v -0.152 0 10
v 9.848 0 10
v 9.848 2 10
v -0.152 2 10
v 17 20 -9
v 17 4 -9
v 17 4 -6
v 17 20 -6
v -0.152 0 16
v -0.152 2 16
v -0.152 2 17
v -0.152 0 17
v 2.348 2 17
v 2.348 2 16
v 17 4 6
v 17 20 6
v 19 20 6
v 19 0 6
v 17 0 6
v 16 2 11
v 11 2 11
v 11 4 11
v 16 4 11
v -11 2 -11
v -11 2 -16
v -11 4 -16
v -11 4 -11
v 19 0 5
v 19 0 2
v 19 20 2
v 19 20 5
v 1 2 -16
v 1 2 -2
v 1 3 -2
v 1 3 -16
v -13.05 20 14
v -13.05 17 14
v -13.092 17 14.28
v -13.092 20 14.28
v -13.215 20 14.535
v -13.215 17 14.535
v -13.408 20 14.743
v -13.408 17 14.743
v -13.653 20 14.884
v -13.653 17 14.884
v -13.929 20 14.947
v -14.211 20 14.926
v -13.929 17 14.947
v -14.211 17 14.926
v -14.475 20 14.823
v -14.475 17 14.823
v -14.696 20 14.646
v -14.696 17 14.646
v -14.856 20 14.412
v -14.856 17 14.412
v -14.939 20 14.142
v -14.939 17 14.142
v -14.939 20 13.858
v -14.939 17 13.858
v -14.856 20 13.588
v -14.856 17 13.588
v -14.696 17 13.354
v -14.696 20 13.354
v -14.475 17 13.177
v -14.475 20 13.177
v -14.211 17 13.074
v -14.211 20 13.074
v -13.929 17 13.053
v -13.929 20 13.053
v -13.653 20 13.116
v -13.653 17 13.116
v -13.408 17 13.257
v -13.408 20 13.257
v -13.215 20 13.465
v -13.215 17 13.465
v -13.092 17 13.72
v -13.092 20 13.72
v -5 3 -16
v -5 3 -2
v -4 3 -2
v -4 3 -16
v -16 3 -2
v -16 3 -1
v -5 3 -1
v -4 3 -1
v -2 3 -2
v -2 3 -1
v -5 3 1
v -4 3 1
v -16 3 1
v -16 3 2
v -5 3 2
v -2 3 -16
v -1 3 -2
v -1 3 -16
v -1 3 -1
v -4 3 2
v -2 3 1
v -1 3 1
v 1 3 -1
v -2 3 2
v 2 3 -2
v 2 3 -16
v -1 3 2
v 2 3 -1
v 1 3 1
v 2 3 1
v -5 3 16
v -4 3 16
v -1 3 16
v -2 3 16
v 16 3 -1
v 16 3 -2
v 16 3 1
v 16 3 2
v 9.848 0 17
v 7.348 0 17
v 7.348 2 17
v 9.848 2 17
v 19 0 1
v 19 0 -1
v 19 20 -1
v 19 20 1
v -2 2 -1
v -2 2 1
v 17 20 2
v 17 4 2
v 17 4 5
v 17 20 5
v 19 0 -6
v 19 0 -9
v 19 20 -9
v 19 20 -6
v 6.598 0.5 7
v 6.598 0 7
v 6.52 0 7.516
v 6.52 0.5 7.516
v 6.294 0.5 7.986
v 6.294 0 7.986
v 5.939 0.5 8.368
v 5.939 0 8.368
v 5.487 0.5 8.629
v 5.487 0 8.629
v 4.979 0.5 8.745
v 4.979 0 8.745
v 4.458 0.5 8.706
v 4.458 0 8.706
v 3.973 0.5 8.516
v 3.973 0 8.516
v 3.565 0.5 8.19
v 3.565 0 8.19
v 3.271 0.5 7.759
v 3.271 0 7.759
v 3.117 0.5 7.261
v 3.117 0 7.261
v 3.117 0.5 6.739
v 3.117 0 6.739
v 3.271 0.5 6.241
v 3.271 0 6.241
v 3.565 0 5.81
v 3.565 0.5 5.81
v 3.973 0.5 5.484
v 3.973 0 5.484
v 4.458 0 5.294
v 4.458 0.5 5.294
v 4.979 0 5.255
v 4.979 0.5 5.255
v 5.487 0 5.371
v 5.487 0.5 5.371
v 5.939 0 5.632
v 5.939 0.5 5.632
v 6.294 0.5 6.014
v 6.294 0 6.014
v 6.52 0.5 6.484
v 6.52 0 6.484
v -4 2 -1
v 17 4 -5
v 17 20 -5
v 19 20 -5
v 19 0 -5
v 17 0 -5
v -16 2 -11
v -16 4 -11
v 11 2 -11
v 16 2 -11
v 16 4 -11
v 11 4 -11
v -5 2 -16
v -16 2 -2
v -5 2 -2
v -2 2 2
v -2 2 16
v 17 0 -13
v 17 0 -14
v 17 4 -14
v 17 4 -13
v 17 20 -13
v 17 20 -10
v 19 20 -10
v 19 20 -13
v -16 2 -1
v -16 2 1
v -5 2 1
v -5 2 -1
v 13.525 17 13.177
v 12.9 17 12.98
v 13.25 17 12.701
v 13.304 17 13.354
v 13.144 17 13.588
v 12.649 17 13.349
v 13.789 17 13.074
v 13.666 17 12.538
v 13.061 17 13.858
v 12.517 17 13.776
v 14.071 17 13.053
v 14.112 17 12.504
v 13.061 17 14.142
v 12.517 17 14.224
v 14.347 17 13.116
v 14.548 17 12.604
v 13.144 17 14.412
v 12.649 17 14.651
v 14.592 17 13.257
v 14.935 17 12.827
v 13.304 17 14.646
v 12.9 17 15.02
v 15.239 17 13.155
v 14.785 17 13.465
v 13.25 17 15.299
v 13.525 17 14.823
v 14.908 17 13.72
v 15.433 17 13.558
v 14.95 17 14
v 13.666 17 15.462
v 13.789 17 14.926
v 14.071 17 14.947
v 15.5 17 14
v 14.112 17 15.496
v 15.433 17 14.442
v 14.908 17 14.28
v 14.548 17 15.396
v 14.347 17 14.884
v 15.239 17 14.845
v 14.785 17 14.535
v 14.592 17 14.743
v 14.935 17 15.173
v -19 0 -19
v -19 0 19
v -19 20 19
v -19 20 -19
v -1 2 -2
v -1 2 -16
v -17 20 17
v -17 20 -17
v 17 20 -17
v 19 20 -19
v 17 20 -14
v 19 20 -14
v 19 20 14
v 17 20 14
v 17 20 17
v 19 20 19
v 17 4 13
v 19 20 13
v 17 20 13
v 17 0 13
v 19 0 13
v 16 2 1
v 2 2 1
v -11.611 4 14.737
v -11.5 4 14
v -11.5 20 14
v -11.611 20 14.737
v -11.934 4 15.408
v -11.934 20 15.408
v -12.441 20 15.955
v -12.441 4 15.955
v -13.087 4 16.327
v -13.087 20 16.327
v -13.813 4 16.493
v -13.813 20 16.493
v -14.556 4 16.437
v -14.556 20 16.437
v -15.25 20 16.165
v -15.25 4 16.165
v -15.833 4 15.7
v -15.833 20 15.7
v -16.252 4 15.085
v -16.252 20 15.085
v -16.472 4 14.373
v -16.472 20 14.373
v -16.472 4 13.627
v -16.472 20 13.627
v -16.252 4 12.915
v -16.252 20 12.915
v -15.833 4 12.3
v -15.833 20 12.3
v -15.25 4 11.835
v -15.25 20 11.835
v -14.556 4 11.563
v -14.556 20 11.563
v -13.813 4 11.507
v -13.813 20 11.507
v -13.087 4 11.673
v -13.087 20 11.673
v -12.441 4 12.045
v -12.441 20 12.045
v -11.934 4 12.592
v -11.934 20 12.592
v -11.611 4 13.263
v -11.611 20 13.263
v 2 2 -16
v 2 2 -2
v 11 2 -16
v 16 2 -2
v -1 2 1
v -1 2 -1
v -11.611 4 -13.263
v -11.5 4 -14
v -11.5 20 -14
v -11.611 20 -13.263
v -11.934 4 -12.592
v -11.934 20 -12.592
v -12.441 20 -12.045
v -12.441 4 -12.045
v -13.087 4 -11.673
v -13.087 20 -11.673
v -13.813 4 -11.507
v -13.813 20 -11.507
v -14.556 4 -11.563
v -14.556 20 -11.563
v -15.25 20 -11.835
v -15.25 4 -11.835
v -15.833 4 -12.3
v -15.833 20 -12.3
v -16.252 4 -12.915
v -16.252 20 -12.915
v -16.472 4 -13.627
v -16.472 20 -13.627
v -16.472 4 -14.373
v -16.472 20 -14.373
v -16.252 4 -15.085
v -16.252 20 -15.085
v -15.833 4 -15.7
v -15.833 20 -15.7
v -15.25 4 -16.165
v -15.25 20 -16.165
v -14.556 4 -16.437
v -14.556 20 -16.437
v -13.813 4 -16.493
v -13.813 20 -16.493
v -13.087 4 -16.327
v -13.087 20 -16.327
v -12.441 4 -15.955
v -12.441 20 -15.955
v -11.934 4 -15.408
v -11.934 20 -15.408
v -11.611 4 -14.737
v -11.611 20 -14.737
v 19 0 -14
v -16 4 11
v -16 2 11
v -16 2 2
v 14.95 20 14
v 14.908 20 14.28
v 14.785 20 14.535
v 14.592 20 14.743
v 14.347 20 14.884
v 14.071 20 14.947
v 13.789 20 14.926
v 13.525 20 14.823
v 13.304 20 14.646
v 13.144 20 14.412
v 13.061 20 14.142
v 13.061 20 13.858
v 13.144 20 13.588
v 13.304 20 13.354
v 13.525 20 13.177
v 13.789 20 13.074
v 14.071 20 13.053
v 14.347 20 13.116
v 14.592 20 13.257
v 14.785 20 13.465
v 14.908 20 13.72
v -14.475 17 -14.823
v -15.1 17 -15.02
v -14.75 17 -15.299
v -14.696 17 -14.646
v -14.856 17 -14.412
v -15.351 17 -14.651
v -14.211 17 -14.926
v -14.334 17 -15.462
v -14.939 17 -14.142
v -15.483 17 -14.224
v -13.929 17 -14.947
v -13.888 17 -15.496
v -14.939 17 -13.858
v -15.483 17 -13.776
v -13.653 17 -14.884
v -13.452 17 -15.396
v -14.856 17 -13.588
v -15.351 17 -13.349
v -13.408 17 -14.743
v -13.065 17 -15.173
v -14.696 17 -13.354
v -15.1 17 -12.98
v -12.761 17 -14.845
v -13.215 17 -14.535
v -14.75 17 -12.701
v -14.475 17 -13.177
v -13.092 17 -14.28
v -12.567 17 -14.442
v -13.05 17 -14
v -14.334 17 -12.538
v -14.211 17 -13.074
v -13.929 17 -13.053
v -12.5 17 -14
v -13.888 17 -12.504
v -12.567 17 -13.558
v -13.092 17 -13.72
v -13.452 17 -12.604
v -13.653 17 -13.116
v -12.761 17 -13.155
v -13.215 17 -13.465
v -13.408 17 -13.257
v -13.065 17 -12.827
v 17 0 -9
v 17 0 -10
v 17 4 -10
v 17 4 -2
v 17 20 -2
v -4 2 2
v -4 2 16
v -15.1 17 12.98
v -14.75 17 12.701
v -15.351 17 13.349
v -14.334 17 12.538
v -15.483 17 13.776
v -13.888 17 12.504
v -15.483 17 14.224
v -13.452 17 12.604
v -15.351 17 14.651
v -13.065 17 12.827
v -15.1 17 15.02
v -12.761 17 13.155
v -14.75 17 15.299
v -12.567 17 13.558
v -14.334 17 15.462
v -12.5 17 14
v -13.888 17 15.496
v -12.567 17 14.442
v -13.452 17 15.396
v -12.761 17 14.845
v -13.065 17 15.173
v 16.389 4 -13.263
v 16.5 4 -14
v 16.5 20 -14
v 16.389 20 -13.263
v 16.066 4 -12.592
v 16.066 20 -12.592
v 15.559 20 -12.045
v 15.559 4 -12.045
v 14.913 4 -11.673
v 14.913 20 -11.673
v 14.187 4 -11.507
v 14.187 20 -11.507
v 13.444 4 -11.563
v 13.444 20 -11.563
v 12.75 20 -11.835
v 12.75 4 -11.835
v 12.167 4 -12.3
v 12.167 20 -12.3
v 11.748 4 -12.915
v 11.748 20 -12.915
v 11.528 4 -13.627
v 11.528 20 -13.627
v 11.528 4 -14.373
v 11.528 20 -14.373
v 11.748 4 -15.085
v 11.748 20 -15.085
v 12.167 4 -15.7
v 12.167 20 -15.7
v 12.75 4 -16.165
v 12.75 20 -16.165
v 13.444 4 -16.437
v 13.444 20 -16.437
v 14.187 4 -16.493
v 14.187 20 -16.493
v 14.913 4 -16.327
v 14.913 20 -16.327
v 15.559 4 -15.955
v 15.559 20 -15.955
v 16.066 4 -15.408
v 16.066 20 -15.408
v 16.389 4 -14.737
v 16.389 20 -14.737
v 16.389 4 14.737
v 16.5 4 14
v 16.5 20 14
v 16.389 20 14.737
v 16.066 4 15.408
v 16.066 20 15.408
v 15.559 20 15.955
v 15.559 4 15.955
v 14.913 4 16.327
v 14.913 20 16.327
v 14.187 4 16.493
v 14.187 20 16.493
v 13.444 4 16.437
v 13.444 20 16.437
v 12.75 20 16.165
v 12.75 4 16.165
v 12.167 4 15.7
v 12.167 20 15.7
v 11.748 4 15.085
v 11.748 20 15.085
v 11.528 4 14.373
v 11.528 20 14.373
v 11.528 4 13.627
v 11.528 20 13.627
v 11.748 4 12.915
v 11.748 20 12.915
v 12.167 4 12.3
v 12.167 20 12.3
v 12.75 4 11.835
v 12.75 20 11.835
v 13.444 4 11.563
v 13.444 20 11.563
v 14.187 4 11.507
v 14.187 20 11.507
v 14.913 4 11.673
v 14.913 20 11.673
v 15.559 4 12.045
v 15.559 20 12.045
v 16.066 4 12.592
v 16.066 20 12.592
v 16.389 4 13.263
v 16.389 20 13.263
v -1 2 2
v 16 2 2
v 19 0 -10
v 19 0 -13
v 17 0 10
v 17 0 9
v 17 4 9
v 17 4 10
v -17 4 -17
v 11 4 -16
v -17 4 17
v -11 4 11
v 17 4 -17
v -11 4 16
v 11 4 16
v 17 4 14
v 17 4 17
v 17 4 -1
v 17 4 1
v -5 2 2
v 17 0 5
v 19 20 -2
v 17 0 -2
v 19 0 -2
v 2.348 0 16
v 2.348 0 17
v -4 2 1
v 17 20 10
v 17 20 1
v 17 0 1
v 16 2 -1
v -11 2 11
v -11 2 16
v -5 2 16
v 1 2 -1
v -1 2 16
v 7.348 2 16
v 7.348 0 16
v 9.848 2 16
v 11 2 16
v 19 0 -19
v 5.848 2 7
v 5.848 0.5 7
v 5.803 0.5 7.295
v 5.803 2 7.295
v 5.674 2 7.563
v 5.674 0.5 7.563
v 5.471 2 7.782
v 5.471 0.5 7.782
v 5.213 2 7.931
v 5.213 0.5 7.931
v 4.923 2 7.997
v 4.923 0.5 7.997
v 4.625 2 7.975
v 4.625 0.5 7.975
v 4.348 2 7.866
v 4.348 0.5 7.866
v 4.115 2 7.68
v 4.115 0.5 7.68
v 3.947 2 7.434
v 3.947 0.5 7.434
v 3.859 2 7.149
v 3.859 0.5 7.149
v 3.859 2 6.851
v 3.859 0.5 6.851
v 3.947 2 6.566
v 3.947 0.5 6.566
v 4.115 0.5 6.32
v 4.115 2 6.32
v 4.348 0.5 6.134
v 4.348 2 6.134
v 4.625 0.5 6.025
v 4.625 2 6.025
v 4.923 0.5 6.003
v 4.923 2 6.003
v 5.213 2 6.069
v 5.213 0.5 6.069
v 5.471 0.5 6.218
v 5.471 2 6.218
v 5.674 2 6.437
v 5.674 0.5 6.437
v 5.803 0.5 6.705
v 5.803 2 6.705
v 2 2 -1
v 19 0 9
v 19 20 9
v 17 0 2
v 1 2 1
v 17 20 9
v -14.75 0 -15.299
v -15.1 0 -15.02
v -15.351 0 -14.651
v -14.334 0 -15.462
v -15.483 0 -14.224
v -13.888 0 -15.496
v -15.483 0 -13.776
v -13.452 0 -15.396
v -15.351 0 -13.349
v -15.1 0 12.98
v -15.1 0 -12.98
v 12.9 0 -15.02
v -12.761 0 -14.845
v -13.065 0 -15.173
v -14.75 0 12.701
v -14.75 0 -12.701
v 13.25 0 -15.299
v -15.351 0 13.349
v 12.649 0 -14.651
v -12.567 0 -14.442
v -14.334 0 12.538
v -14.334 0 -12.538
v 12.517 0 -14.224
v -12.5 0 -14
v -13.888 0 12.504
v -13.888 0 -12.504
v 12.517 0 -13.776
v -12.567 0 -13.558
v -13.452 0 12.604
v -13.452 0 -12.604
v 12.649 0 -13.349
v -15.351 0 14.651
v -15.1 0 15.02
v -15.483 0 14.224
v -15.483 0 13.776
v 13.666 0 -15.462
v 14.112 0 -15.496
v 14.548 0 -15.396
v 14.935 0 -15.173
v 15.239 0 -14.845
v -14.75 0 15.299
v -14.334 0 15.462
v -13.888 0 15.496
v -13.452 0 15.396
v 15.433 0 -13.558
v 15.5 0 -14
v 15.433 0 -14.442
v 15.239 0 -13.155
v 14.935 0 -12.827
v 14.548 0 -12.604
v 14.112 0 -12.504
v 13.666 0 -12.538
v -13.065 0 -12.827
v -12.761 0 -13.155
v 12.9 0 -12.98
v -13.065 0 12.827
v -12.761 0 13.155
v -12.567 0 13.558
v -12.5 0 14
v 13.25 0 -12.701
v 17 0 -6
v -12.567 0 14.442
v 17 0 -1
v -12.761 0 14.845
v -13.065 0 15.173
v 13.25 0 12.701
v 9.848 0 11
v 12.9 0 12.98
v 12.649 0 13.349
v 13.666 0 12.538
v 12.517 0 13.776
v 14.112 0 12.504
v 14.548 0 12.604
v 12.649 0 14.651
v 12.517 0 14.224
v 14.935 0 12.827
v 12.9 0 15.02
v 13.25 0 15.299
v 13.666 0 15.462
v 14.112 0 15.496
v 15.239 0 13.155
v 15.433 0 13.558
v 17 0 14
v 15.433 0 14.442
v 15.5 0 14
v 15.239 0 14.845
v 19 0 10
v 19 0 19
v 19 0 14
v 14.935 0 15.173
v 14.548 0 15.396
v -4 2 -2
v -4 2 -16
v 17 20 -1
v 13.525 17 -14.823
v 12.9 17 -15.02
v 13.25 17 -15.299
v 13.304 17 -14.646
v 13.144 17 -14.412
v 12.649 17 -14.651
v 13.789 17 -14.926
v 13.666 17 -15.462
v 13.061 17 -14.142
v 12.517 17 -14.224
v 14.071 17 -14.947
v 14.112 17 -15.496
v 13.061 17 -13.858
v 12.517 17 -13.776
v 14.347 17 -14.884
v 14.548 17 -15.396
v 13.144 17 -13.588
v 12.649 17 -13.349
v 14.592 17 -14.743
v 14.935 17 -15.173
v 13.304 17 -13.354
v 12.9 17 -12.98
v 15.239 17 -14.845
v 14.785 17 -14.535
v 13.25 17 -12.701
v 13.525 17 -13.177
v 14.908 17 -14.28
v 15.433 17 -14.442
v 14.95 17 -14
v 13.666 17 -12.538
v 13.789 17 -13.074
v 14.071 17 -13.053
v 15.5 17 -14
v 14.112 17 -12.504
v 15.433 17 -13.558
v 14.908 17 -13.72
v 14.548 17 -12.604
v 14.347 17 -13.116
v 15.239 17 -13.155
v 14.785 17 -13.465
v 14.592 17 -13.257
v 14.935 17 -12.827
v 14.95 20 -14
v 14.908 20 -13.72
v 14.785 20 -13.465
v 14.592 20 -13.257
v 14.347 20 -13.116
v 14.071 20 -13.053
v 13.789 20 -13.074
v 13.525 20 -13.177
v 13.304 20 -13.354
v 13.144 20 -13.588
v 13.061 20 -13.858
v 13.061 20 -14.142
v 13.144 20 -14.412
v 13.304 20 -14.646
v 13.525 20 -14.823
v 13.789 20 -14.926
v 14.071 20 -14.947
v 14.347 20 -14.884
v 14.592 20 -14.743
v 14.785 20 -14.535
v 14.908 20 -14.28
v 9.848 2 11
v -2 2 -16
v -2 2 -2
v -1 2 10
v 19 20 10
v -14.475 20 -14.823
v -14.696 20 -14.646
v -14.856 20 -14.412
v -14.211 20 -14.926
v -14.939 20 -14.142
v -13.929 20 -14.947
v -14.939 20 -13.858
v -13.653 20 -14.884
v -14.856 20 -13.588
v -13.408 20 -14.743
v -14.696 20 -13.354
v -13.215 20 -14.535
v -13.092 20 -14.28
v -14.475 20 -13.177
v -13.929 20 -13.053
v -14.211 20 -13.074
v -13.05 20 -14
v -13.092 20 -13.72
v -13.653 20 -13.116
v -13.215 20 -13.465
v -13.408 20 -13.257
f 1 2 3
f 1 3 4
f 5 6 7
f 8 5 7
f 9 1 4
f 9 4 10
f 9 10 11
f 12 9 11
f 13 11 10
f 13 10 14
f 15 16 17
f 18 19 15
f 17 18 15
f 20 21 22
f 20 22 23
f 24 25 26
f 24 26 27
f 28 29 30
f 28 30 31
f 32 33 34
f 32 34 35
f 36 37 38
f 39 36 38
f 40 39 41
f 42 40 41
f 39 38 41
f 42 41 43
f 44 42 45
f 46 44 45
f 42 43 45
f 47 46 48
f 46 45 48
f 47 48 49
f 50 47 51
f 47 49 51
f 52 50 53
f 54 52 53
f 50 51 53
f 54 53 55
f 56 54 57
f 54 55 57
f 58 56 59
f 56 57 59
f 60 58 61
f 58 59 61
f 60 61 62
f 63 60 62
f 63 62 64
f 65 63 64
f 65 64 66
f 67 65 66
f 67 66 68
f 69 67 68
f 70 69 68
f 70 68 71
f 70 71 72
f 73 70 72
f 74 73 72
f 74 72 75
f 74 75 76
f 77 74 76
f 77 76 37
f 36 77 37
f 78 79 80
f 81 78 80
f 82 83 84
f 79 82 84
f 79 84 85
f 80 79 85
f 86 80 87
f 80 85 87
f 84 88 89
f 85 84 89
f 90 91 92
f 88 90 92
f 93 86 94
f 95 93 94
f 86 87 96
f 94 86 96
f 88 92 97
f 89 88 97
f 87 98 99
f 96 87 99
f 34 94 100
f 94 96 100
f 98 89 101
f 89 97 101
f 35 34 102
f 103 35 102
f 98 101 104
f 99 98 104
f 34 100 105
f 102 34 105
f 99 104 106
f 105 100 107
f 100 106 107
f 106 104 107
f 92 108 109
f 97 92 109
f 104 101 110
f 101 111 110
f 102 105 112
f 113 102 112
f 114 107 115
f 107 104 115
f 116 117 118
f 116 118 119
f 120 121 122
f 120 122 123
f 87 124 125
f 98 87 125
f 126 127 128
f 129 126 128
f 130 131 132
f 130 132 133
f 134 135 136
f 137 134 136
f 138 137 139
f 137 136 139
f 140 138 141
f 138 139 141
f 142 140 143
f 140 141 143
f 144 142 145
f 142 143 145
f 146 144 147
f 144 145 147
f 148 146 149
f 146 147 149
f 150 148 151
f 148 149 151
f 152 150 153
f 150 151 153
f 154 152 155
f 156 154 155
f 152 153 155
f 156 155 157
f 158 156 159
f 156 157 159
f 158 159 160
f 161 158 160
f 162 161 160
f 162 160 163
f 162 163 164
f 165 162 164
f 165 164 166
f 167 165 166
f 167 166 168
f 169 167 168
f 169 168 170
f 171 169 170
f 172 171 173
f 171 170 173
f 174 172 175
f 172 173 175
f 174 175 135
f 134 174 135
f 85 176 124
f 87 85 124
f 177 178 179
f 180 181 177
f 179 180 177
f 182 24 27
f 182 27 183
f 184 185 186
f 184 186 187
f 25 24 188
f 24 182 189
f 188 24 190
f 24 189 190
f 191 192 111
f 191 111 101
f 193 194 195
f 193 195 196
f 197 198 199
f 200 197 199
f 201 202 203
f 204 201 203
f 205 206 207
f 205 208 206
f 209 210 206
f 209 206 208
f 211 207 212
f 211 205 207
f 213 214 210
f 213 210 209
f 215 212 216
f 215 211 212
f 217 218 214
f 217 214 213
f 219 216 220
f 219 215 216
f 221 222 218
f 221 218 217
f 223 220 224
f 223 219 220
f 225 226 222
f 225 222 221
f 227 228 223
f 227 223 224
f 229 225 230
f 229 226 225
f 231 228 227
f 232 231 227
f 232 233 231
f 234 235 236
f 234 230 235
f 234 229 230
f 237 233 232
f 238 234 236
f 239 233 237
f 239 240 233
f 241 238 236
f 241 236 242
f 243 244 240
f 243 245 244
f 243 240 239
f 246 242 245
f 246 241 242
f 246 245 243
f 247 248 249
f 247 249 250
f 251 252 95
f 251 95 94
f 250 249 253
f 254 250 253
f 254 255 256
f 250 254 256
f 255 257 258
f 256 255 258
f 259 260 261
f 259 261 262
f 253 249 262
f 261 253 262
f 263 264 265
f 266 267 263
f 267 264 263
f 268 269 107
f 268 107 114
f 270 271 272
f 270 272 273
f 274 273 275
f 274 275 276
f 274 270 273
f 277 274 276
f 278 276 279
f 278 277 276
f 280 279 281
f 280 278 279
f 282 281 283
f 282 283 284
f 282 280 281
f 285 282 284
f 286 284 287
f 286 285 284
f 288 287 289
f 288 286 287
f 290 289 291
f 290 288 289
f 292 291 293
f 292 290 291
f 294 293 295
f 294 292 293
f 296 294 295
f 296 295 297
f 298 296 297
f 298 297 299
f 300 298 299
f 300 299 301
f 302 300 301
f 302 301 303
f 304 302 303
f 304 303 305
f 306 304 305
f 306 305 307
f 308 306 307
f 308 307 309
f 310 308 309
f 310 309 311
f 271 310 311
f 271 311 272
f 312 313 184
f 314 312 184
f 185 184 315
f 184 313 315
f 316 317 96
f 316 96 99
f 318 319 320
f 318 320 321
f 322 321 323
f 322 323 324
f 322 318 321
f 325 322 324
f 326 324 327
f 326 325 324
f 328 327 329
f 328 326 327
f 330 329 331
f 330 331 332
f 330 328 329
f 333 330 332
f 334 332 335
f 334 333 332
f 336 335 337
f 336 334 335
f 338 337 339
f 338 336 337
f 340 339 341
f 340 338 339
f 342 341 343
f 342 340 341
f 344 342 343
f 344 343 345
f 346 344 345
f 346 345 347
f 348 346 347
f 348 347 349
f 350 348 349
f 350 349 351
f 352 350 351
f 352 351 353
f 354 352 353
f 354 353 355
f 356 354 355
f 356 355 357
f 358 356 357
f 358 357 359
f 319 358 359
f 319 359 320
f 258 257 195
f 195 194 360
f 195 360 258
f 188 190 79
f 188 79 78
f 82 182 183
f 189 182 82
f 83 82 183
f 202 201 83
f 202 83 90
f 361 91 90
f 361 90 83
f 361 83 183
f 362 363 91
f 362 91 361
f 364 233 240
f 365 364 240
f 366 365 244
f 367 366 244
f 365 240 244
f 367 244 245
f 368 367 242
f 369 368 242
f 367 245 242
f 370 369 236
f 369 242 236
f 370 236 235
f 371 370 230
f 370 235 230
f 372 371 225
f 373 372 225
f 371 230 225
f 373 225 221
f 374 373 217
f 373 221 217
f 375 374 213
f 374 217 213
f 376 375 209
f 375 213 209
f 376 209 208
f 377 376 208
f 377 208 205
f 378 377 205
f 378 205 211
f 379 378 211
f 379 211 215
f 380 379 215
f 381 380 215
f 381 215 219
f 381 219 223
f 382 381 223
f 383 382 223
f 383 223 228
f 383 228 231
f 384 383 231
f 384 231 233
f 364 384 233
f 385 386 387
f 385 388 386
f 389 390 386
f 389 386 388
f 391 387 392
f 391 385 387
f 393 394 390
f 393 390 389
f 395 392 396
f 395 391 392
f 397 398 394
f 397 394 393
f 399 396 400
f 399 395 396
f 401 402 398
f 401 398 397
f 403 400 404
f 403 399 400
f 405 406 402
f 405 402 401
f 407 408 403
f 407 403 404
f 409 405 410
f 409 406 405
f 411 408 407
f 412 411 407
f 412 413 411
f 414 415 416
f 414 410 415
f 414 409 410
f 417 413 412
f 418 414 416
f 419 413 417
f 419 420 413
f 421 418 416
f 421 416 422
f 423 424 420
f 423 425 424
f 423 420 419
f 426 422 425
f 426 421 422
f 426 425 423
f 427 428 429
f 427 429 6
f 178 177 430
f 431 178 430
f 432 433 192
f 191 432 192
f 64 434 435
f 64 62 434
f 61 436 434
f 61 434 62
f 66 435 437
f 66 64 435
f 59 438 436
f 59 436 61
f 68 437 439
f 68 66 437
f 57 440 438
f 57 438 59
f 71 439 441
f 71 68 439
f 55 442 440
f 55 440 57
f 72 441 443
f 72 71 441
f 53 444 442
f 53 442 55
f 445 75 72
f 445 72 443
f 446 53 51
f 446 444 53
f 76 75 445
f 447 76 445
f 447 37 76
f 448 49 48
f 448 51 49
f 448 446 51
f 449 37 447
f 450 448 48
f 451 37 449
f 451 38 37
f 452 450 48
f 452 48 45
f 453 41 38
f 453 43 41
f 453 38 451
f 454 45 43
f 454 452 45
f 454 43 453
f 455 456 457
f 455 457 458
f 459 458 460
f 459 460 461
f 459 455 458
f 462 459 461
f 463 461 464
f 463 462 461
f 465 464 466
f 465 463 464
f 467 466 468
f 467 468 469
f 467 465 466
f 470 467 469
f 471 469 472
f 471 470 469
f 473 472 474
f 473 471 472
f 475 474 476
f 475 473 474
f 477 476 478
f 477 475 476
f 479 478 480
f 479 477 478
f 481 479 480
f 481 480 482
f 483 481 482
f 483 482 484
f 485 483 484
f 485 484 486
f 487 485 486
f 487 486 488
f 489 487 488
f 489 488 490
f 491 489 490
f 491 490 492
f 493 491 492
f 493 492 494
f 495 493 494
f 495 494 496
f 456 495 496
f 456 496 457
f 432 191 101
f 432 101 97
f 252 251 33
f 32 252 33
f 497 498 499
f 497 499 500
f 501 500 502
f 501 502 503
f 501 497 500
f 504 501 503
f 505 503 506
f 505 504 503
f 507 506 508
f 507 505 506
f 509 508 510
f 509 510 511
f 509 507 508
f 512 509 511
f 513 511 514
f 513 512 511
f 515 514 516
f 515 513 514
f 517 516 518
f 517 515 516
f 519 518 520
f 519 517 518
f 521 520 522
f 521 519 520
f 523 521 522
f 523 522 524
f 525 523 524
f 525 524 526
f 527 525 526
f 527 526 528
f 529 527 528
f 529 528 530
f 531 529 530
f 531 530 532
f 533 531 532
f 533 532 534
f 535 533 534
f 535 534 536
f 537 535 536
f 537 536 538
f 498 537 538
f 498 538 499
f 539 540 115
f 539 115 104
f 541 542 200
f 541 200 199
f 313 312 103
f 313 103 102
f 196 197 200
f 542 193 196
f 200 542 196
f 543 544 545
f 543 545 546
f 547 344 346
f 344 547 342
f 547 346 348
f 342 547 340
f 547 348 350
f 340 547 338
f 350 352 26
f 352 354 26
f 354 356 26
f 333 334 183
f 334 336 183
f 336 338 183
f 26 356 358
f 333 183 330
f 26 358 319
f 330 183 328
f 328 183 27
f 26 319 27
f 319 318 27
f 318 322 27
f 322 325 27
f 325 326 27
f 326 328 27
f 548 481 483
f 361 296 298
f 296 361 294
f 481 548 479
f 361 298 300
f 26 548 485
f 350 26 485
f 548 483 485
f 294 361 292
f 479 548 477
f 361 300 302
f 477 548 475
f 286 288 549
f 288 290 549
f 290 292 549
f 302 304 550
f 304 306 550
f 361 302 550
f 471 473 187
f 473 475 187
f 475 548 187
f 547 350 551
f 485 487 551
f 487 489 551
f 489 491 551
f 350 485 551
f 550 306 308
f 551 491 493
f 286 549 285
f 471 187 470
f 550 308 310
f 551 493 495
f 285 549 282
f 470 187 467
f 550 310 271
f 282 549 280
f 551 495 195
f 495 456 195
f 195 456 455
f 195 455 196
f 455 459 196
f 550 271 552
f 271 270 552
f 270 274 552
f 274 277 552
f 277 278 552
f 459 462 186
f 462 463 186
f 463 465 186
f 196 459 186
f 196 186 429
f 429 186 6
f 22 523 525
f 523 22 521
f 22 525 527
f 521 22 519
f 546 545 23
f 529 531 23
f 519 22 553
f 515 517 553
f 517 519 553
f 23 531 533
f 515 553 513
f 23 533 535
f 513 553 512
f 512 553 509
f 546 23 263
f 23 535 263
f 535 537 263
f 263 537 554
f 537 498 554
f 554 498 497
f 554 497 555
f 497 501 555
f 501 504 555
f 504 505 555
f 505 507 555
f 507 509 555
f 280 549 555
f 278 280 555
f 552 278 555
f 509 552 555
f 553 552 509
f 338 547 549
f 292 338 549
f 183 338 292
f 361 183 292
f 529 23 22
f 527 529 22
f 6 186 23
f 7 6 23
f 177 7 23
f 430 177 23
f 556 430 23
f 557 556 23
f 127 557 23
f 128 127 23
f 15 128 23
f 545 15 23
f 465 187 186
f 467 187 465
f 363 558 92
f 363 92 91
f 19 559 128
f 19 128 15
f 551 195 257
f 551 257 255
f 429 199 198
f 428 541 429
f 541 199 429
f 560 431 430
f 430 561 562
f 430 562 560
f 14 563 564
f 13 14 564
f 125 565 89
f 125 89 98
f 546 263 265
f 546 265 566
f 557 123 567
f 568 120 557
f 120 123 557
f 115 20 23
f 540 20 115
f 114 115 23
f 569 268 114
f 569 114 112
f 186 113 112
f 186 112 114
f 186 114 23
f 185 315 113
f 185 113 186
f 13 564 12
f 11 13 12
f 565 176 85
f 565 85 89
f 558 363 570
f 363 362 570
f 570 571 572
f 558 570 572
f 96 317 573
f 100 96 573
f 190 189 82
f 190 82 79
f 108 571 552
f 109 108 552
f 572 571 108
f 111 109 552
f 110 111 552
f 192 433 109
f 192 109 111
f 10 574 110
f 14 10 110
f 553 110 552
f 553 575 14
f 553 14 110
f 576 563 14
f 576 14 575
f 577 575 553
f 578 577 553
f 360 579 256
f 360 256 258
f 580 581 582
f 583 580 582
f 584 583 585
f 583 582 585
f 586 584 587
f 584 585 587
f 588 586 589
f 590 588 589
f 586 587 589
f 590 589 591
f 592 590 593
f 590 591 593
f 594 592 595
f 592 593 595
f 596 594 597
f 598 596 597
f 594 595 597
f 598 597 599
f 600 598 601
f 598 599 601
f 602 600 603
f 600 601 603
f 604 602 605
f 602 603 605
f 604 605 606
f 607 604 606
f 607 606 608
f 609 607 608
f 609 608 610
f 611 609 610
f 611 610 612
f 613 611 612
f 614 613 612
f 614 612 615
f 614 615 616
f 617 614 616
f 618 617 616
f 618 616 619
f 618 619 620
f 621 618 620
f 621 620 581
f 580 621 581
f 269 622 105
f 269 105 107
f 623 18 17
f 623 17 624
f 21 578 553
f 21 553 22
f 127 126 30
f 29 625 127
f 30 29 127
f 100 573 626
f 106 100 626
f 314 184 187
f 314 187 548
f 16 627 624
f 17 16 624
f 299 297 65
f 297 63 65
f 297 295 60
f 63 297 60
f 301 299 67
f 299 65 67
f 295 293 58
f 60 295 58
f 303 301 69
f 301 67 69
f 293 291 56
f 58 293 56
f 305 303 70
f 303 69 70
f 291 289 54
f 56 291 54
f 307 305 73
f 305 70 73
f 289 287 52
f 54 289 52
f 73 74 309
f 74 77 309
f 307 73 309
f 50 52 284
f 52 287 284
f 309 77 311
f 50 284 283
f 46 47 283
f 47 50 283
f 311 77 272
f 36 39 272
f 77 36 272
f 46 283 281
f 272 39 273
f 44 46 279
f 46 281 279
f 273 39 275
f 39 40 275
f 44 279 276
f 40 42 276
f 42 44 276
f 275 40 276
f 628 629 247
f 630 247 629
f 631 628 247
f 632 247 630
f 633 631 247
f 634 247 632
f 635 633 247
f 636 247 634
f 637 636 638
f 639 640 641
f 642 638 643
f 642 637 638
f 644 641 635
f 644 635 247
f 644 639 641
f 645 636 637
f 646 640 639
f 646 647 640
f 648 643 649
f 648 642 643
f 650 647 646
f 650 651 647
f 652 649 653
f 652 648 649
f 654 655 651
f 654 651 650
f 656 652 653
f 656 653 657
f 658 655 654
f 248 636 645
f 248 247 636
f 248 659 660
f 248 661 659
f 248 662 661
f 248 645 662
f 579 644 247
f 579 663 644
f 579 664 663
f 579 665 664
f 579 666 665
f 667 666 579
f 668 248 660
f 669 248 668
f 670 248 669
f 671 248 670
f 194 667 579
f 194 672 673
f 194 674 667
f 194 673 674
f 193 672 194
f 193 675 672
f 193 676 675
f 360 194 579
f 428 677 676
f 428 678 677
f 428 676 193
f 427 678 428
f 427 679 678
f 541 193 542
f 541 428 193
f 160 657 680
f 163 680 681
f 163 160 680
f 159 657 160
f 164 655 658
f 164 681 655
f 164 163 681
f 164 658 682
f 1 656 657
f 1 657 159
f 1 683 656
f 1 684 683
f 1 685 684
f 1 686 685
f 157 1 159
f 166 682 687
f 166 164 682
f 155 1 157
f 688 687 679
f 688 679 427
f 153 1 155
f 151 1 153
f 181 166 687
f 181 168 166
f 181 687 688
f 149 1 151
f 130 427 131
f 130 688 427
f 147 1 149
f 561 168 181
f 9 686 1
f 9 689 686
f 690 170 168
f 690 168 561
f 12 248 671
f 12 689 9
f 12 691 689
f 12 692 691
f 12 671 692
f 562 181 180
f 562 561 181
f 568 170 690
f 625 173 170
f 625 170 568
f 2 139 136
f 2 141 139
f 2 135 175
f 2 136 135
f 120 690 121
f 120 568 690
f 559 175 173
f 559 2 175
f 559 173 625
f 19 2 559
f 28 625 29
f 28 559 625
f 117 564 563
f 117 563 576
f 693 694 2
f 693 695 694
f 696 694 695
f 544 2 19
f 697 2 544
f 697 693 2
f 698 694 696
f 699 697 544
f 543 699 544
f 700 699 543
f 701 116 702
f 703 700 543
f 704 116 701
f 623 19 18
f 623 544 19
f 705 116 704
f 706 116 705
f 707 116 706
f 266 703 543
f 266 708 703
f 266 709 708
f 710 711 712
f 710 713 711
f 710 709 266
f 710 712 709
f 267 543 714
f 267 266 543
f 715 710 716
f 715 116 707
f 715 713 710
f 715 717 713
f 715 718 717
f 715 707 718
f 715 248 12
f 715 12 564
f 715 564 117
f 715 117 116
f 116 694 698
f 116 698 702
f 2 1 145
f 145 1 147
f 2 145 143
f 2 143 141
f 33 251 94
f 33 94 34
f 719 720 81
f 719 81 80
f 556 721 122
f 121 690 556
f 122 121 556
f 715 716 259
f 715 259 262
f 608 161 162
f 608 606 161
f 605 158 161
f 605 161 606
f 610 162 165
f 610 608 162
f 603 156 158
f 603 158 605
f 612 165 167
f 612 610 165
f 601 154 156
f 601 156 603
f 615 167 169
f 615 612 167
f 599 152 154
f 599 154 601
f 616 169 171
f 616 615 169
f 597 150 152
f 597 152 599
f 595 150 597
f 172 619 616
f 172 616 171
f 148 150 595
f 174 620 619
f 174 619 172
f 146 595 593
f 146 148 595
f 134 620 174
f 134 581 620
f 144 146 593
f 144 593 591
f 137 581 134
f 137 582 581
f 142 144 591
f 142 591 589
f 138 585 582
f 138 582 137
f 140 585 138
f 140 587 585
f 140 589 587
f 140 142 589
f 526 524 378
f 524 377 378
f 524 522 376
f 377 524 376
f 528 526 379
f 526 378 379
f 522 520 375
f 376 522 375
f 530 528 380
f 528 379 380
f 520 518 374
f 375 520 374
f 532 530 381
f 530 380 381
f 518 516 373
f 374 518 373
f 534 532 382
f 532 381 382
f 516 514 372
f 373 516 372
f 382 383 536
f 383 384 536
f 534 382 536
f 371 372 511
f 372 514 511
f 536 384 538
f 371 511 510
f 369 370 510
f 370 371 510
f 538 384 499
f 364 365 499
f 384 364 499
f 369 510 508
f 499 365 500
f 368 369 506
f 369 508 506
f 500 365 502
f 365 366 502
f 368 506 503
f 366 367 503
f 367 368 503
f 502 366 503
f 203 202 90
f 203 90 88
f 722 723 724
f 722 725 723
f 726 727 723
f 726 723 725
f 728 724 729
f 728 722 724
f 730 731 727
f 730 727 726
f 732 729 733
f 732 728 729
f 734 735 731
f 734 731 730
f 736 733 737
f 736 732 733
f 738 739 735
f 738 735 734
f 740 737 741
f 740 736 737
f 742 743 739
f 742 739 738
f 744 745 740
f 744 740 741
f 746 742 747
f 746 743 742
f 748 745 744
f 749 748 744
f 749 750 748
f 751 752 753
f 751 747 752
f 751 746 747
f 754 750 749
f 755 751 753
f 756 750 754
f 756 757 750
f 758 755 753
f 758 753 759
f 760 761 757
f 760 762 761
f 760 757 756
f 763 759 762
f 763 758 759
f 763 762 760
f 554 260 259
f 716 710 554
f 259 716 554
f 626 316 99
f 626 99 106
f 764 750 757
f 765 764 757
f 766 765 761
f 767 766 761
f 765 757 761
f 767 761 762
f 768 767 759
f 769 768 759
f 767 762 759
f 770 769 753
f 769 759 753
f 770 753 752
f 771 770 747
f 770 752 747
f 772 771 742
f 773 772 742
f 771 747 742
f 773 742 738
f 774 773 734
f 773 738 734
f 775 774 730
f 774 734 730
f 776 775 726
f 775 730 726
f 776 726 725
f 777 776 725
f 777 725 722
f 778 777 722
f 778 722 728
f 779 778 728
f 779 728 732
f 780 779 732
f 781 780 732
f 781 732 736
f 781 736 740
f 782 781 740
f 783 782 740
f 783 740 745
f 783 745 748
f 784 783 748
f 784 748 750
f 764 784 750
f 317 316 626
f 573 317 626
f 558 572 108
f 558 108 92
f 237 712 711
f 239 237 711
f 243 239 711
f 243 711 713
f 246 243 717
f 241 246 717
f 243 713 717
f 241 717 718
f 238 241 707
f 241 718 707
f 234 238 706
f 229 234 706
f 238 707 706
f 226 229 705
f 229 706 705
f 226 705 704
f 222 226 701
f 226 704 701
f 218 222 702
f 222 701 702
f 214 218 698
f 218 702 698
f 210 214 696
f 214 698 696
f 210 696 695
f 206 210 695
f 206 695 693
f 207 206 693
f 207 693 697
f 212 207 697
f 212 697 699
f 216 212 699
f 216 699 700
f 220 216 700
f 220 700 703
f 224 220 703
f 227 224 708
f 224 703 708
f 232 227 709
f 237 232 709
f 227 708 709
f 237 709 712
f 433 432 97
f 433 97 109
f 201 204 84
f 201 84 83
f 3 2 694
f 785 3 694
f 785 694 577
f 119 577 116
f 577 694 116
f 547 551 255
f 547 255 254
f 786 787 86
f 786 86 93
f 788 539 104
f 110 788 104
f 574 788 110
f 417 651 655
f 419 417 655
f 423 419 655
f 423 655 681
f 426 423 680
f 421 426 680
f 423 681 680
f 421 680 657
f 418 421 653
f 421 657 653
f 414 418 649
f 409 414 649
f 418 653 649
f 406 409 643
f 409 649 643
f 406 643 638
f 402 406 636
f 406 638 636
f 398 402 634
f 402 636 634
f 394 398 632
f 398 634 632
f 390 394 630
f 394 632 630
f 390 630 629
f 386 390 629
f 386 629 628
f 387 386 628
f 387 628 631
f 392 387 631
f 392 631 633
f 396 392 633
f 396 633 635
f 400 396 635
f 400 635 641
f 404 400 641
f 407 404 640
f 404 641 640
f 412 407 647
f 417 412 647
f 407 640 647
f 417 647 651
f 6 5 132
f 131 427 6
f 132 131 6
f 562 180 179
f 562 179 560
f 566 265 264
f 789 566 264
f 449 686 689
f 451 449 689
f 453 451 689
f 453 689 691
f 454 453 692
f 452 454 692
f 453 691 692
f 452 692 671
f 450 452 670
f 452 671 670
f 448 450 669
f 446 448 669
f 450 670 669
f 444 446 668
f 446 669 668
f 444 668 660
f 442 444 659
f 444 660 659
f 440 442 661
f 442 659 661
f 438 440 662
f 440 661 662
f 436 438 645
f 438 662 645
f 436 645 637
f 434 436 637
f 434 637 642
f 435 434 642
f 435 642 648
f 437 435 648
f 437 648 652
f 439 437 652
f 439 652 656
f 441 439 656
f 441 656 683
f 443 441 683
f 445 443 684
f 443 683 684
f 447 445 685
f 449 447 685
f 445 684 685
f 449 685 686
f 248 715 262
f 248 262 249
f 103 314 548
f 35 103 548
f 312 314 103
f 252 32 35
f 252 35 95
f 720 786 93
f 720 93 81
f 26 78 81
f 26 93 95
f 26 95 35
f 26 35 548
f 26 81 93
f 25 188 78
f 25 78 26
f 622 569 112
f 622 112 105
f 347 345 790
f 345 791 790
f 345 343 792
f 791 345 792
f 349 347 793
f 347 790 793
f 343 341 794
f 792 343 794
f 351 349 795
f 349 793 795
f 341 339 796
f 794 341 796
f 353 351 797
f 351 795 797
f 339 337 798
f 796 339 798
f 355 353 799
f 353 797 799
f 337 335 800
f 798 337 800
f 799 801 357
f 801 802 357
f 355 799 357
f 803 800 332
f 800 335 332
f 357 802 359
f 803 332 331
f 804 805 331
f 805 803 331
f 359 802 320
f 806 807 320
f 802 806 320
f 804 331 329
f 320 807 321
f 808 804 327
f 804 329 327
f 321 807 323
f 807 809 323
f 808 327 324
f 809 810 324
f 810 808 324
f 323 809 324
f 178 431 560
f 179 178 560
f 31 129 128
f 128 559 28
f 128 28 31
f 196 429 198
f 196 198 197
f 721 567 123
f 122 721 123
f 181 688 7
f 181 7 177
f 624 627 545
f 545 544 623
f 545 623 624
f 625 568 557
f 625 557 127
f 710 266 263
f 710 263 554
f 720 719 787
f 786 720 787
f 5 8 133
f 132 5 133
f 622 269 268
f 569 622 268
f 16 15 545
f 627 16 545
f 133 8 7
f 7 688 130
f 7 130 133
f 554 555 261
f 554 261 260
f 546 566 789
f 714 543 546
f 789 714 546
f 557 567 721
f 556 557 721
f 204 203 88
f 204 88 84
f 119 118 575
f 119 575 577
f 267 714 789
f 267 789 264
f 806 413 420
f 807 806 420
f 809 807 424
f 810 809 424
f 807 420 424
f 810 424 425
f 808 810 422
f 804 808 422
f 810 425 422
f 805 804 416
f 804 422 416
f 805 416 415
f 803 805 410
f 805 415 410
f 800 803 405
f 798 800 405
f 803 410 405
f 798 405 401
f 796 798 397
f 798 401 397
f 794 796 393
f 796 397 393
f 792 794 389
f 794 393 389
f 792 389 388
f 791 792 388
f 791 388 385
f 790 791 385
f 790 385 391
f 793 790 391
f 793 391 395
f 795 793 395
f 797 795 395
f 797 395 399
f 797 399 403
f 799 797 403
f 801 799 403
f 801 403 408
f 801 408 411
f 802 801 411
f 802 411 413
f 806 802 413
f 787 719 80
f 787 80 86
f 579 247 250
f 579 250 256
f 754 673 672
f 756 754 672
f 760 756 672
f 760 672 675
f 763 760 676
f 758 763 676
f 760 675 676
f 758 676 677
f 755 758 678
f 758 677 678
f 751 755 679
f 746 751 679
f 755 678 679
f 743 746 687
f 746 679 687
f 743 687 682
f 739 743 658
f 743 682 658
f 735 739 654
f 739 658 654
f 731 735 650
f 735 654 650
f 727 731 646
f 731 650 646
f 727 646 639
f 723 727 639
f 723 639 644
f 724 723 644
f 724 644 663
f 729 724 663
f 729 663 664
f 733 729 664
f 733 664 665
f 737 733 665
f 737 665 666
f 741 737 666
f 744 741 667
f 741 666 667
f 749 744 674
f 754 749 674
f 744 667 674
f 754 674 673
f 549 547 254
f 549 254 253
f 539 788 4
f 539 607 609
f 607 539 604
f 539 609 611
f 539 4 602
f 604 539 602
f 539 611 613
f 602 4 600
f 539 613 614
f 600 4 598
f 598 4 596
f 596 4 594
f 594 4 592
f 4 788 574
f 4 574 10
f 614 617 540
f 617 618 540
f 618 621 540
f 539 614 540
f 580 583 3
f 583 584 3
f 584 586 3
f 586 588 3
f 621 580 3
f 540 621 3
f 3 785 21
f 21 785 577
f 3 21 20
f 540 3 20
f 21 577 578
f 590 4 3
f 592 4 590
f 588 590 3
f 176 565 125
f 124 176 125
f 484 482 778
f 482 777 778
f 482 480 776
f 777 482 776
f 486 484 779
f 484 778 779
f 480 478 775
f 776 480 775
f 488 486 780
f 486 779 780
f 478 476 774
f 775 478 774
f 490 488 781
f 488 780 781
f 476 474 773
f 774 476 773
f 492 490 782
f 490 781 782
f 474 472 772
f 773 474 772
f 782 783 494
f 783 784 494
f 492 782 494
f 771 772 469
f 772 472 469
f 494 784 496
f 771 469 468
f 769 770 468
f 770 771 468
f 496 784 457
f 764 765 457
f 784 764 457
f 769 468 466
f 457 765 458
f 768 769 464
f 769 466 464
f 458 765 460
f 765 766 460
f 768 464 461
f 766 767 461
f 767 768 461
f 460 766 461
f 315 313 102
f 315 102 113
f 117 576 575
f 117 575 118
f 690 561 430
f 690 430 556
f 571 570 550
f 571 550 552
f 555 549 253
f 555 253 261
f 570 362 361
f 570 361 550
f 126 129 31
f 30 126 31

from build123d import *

# Parameters (mm, degrees)
F0_W      = 2
F0_H      = 2
F1_DEPTH  = 3
F0_H_2    = 14
F0_W_2    = 14
F0_W_3    = 11
F2_DEPTH  = 2
F0_R      = 2.5
F3_DEPTH  = 4
F0_R_2    = 1.5
F0_R_3    = 0.95
F4_DEPTH  = 20
F5_DEPTH  = 17
F6_DEPTH  = 17
F7_DEPTH  = 17
F8_DEPTH  = 17
F0_W_4    = 6
F0_H_3    = 6
F9_DEPTH  = 2
F0_H_4    = 3
F10_DEPTH = 20
F0_W_5    = 3
F0_W_6    = 5
F0_W_7    = 1.1521804929
F0_H_5    = 5
F0_R_4    = 1.75
F0_R_5    = 1
F0_W_8    = 0.8478195071
F11_DEPTH = 2
F0_H_6    = 1
F12_DEPTH = 4
F0_W_9    = 2.5
F13_DEPTH = 4
F14_DEPTH = 2
F15_DEPTH = 2
F16_DEPTH = 0.5


# Not quite as in the source:
# - a feature names something its author has since deleted; it is built from what else it names


with BuildPart() as f1:
    # F0 (on Front) → F1 (new body)
    with BuildSketch(Plane.XZ):
        Polygon((16, 1), (16, 2), (2, 2), (1, 2), (-1, 2), (-1, 10), (-1, 16), (-2, 16), (-2, 2), (-4, 2), (-4, 16), (-5, 16), (-5, 2), (-16, 2), (-16, 1), (-5, 1), (-5, -1), (-16, -1), (-16, -2), (-5, -2), (-5, -16), (-4, -16), (-4, -2), (-2, -2), (-2, -16), (-1, -16), (-1, -2), (1, -2), (1, -16), (2, -16), (2, -2), (16, -2), (16, -1), (2, -1), (2, 1), align=None)
        with Locations((-3, 0)):
            Rectangle(F0_W, F0_H, mode=Mode.SUBTRACT)
        Rectangle(F0_W, F0_H, mode=Mode.SUBTRACT)
    extrude(amount=-F1_DEPTH)

    # F0 (on Front) → F2 (join)
    with BuildSketch(Plane.XZ):
        Polygon((16, 2), (16, 10.1685791543), (16, 11), (11, 11), (9.8478195071, 11), (9.8478195071, 10.2023985237), (9.8478195071, 10), (7.6956390142, 10), (7.6956390142, 7.9433578615), (7.6956390142, 6.0566421385), (7.6956390142, 4), (4.8478195071, 4), (2, 4), (2, 6.0566421385), (2, 7.9433578615), (2, 10), (-0.1521804929, 10), (-1, 10), (-1, 2), (1, 2), (2, 2), align=None)
        with Locations((-3, 9)):
            Rectangle(F0_W, F0_H_2)
        Polygon((16, -11), (16, -2), (2, -2), (2, -16), (11, -16), (11, -11), align=None)
        with Locations((9, 0)):
            Rectangle(F0_W_2, F0_H)
        with Locations((-10.5, 0)):
            Rectangle(F0_W_3, F0_H)
        Polygon((-11, -11), (-11, -16), (-5, -16), (-5, -2), (-16, -2), (-16, -11), align=None)
        with Locations((-3, -9)):
            Rectangle(F0_W, F0_H_2)
        with Locations((0, -9)):
            Rectangle(F0_W, F0_H_2)
        Polygon((-5, 2), (-5, 16), (-11, 16), (-11, 11), (-16, 11), (-16, 10), (-10, 10), (-10, 4), (-16, 4), (-16, 2), align=None)
        with Locations((-3, 0)):
            Rectangle(F0_W, F0_H)
        Rectangle(F0_W, F0_H)
    extrude(amount=-F2_DEPTH)

    # F0 (on Front) → F3 (join)
    with BuildSketch(Plane.XZ):
        Polygon((11, 11), (16, 11), (17, 11), (17, 13), (17, 14), (17, 17), (14, 17), (11, 17), (11, 16), align=None)
        with Locations((14, 14)):
            Circle(F0_R, mode=Mode.SUBTRACT)
        Polygon((-11, 16), (-11, 17), (-14, 17), (-17, 17), (-17, 14), (-17, 11), (-16, 11), (-11, 11), align=None)
        with Locations((-14, 14)):
            Circle(F0_R, mode=Mode.SUBTRACT)
        Polygon((-14, -17), (-11, -17), (-11, -16), (-11, -11), (-16, -11), (-17, -11), (-17, -14), (-17, -17), align=None)
        with Locations((-14, -14)):
            Circle(F0_R, mode=Mode.SUBTRACT)
        Polygon((17, -11), (16, -11), (11, -11), (11, -16), (11, -17), (14, -17), (17, -17), (17, -14), (17, -13), align=None)
        with Locations((14, -14)):
            Circle(F0_R, mode=Mode.SUBTRACT)
    extrude(amount=-F3_DEPTH)

    # F0 (on Front) → F4 (join)
    with BuildSketch(Plane.XZ):
        with Locations((14, 14)):
            Circle(F0_R)
        with Locations((14, 14)):
            Circle(F0_R_2, mode=Mode.SUBTRACT)
        with Locations((14, 14)):
            Circle(F0_R_2)
        with Locations((14, 14)):
            Circle(F0_R_3, mode=Mode.SUBTRACT)
        with Locations((-14, 14)):
            Circle(F0_R)
        with Locations((-14, 14)):
            Circle(F0_R_2, mode=Mode.SUBTRACT)
        with Locations((-14, 14)):
            Circle(F0_R_2)
        with Locations((-14, 14)):
            Circle(F0_R_3, mode=Mode.SUBTRACT)
        with Locations((-14, -14)):
            Circle(F0_R)
        with Locations((-14, -14)):
            Circle(F0_R_2, mode=Mode.SUBTRACT)
        with Locations((-14, -14)):
            Circle(F0_R_2)
        with Locations((-14, -14)):
            Circle(F0_R_3, mode=Mode.SUBTRACT)
        with Locations((14, -14)):
            Circle(F0_R)
        with Locations((14, -14)):
            Circle(F0_R_2, mode=Mode.SUBTRACT)
        with Locations((14, -14)):
            Circle(F0_R_2)
        with Locations((14, -14)):
            Circle(F0_R_3, mode=Mode.SUBTRACT)
    extrude(amount=-F4_DEPTH)

    # F0 (on Front) → F5 (cut)
    with BuildSketch(Plane.XZ):
        with Locations((-14, 14)):
            Circle(F0_R_2)
        with Locations((-14, 14)):
            Circle(F0_R_3, mode=Mode.SUBTRACT)
    extrude(amount=-F5_DEPTH, mode=Mode.SUBTRACT)

    # F0 (on Front) → F6 (cut)
    with BuildSketch(Plane.XZ):
        with Locations((14, 14)):
            Circle(F0_R_2)
        with Locations((14, 14)):
            Circle(F0_R_3, mode=Mode.SUBTRACT)
    extrude(amount=-F6_DEPTH, mode=Mode.SUBTRACT)

    # F0 (on Front) → F7 (cut)
    with BuildSketch(Plane.XZ):
        with Locations((-14, -14)):
            Circle(F0_R_2)
        with Locations((-14, -14)):
            Circle(F0_R_3, mode=Mode.SUBTRACT)
    extrude(amount=-F7_DEPTH, mode=Mode.SUBTRACT)

    # F0 (on Front) → F8 (cut)
    with BuildSketch(Plane.XZ):
        with Locations((14, -14)):
            Circle(F0_R_2)
        with Locations((14, -14)):
            Circle(F0_R_3, mode=Mode.SUBTRACT)
    extrude(amount=-F8_DEPTH, mode=Mode.SUBTRACT)

    # F0 (on Front) → F9 (join)
    with BuildSketch(Plane.XZ):
        with Locations((-13, 7)):
            Rectangle(F0_W_4, F0_H_3)
    extrude(amount=-F9_DEPTH)

    # F0 (on Front) → F10, piece 6 (join)
    with BuildSketch(Plane.XZ):
        with Locations((18, 18)):
            Rectangle(F0_W, F0_H)
        with Locations((18, 15.5)):
            Rectangle(F0_W, F0_H_4)
        with Locations((15.5, 18)):
            Rectangle(F0_W_5, F0_H)
        Polygon((9.8478195071, 17), (11, 17), (14, 17), (14, 19), (7.3478195071, 19), (7.3478195071, 17), align=None)
        with Locations((4.8478195071, 18)):
            Rectangle(F0_W_6, F0_H)
        Polygon((-0.1521804929, 17), (2.3478195071, 17), (2.3478195071, 19), (-14, 19), (-14, 17), (-11, 17), align=None)
        with Locations((-15.5, 18)):
            Rectangle(F0_W_5, F0_H)
        with Locations((-18, 18)):
            Rectangle(F0_W, F0_H)
        with Locations((-18, 15.5)):
            Rectangle(F0_W, F0_H_4)
        Polygon((-19, -14), (-17, -14), (-17, -11), (-17, -2), (-17, -1), (-17, 1), (-17, 2), (-17, 11), (-17, 14), (-19, 14), align=None)
        Polygon((17, 13), (17, 11), (17, 10), (19, 10), (19, 13), align=None)
        Polygon((17, -10), (17, -11), (17, -13), (19, -13), (19, -10), align=None)
        with Locations((18, -15.5)):
            Rectangle(F0_W, F0_H_4)
        with Locations((18, -18)):
            Rectangle(F0_W, F0_H)
        with Locations((15.5, -18)):
            Rectangle(F0_W_5, F0_H)
        Polygon((14, -17), (11, -17), (-11, -17), (-14, -17), (-14, -19), (14, -19), align=None)
        with Locations((-15.5, -18)):
            Rectangle(F0_W_5, F0_H)
        with Locations((-18, -18)):
            Rectangle(F0_W, F0_H)
        with Locations((-18, -15.5)):
            Rectangle(F0_W, F0_H_4)
    extrude(amount=-F10_DEPTH)

    # F0 (on Front) → F11 (join)
    with BuildSketch(Plane.XZ):
        with Locations((10.4239097536, 13.5)):
            Rectangle(F0_W_7, F0_H_5)
        with BuildLine():
            Line((7.6956390142, 7.9433578615), (7.6956390142, 10))
            Line((7.6956390142, 10), (4.8478195071, 10))
            ThreePointArc((4.8478195071, 10), (6.6042258404, 9.4320848653), (7.6956390142, 7.9433578615))
        make_face()
        with BuildLine():
            ThreePointArc((7.6956390142, 7.9433578615), (6.6042258404, 9.4320848653), (4.8478195071, 10))
            ThreePointArc((4.8478195071, 10), (3.0914131738, 9.4320848653), (2, 7.9433578615))
            Line((2, 7.9433578615), (2, 6.0566421385))
            ThreePointArc((2, 6.0566421385), (3.0914131738, 4.5679151347), (4.8478195071, 4))
            ThreePointArc((4.8478195071, 4), (6.6042258404, 4.5679151347), (7.6956390142, 6.0566421385))
            Line((7.6956390142, 6.0566421385), (7.6956390142, 7.9433578615))
        make_face()
        with Locations((4.8478195071, 7)):
            Circle(F0_R_4, mode=Mode.SUBTRACT)
        with BuildLine():
            Line((7.6956390142, 4), (7.6956390142, 6.0566421385))
            ThreePointArc((7.6956390142, 6.0566421385), (6.6042258404, 4.5679151347), (4.8478195071, 4))
            Line((4.8478195071, 4), (7.6956390142, 4))
        make_face()
        with Locations((4.8478195071, 7)):
            Circle(F0_R_4)
        with Locations((4.8478195071, 7)):
            Circle(F0_R_5, mode=Mode.SUBTRACT)
        with BuildLine():
            ThreePointArc((4.8478195071, 4), (3.0914131738, 4.5679151347), (2, 6.0566421385))
            Line((2, 6.0566421385), (2, 4))
            Line((2, 4), (4.8478195071, 4))
        make_face()
        with BuildLine():
            Line((4.8478195071, 10), (2, 10))
            Line((2, 10), (2, 7.9433578615))
            ThreePointArc((2, 7.9433578615), (3.0914131738, 9.4320848653), (4.8478195071, 10))
        make_face()
        with Locations((-0.5760902464, 13)):
            Rectangle(F0_W_8, F0_H_3)
    extrude(amount=-F11_DEPTH)



with BuildPart() as f10:
    # F0 (on Front) → F10 (new body)
    with BuildSketch(Plane.XZ):
        with Locations((18, 7.5)):
            Rectangle(F0_W, F0_H_4)
    extrude(amount=-F10_DEPTH)


with BuildPart() as f10b:
    # F0 (on Front) → F10, piece 2 (new body)
    with BuildSketch(Plane.XZ):
        with Locations((18, 3.5)):
            Rectangle(F0_W, F0_H_4)
    extrude(amount=-F10_DEPTH)


with BuildPart() as f10c:
    # F0 (on Front) → F10, piece 3 (new body)
    with BuildSketch(Plane.XZ):
        Polygon((19, 1), (17, 1), (17, 0), (17, -1), (19, -1), (19, 0), align=None)
    extrude(amount=-F10_DEPTH)


with BuildPart() as f10d:
    # F0 (on Front) → F10, piece 4 (new body)
    with BuildSketch(Plane.XZ):
        with Locations((18, -3.5)):
            Rectangle(F0_W, F0_H_4)
    extrude(amount=-F10_DEPTH)


with BuildPart() as f10e:
    # F0 (on Front) → F10, piece 5 (new body)
    with BuildSketch(Plane.XZ):
        with Locations((18, -7.5)):
            Rectangle(F0_W, F0_H_4)
    extrude(amount=-F10_DEPTH)


with BuildPart() as f1_1:
    add(f1.part)

    add(f10.part)  # F12 merges F10

    add(f10b.part)  # F12 merges F10b

    add(f10c.part)  # F12 merges F10c

    add(f10d.part)  # F12 merges F10d

    add(f10e.part)  # F12 merges F10e
    # F0 (on Front) → F12 (join)
    with BuildSketch(Plane.XZ):
        Polygon((16, 11), (16, 10.1685791543), (16, 2), (16, 1), (16, -1), (16, -2), (16, -11), (17, -11), (17, -10), (17, -9), (17, -6), (17, -5), (17, -2), (17, -1), (17, 0), (17, 1), (17, 2), (17, 5), (17, 6), (17, 9), (17, 10), (17, 11), align=None)
        with Locations((4.8478195071, 16.5)):
            Rectangle(F0_W_6, F0_H_6)
        Polygon((11, -16), (2, -16), (1, -16), (-1, -16), (-2, -16), (-4, -16), (-5, -16), (-11, -16), (-11, -17), (11, -17), align=None)
        Polygon((-2, 16), (-1, 16), (-0.1521804929, 16), (-0.1521804929, 17), (-11, 17), (-11, 16), (-5, 16), (-4, 16), align=None)
        Polygon((-16, 1), (-16, 2), (-16, 4), (-16, 10), (-16, 11), (-17, 11), (-17, 2), (-17, 1), (-17, -1), (-17, -2), (-17, -11), (-16, -11), (-16, -2), (-16, -1), align=None)
    extrude(amount=-F12_DEPTH)

    # F0 (on Front) → F13 (join)
    with BuildSketch(Plane.XZ):
        with Locations((10.4239097536, 16.5)):
            Rectangle(F0_W_7, F0_H_6)
        with Locations((8.5978195071, 16.5)):
            Rectangle(F0_W_9, F0_H_6)
        Polygon((2, 16), (2.3478195071, 16), (2.3478195071, 17), (-0.1521804929, 17), (-0.1521804929, 16), (1, 16), align=None)
    extrude(amount=-F13_DEPTH)

    # F0 (on Front) → F14 (cut)
    with BuildSketch(Plane.XZ):
        Polygon((2, 16), (2.3478195071, 16), (2.3478195071, 17), (-0.1521804929, 17), (-0.1521804929, 16), (1, 16), align=None)
    extrude(amount=-F14_DEPTH, mode=Mode.SUBTRACT)

    # F0 (on Front) → F15 (cut)
    with BuildSketch(Plane.XZ):
        with Locations((8.5978195071, 16.5)):
            Rectangle(F0_W_9, F0_H_6)
    extrude(amount=-F15_DEPTH, mode=Mode.SUBTRACT)

    # F0 (on Front) → F16 (cut)
    with BuildSketch(Plane.XZ):
        with Locations((4.8478195071, 7)):
            Circle(F0_R_4)
        with Locations((4.8478195071, 7)):
            Circle(F0_R_5, mode=Mode.SUBTRACT)
    extrude(amount=-F16_DEPTH, mode=Mode.SUBTRACT)


solid = f1_1.part
